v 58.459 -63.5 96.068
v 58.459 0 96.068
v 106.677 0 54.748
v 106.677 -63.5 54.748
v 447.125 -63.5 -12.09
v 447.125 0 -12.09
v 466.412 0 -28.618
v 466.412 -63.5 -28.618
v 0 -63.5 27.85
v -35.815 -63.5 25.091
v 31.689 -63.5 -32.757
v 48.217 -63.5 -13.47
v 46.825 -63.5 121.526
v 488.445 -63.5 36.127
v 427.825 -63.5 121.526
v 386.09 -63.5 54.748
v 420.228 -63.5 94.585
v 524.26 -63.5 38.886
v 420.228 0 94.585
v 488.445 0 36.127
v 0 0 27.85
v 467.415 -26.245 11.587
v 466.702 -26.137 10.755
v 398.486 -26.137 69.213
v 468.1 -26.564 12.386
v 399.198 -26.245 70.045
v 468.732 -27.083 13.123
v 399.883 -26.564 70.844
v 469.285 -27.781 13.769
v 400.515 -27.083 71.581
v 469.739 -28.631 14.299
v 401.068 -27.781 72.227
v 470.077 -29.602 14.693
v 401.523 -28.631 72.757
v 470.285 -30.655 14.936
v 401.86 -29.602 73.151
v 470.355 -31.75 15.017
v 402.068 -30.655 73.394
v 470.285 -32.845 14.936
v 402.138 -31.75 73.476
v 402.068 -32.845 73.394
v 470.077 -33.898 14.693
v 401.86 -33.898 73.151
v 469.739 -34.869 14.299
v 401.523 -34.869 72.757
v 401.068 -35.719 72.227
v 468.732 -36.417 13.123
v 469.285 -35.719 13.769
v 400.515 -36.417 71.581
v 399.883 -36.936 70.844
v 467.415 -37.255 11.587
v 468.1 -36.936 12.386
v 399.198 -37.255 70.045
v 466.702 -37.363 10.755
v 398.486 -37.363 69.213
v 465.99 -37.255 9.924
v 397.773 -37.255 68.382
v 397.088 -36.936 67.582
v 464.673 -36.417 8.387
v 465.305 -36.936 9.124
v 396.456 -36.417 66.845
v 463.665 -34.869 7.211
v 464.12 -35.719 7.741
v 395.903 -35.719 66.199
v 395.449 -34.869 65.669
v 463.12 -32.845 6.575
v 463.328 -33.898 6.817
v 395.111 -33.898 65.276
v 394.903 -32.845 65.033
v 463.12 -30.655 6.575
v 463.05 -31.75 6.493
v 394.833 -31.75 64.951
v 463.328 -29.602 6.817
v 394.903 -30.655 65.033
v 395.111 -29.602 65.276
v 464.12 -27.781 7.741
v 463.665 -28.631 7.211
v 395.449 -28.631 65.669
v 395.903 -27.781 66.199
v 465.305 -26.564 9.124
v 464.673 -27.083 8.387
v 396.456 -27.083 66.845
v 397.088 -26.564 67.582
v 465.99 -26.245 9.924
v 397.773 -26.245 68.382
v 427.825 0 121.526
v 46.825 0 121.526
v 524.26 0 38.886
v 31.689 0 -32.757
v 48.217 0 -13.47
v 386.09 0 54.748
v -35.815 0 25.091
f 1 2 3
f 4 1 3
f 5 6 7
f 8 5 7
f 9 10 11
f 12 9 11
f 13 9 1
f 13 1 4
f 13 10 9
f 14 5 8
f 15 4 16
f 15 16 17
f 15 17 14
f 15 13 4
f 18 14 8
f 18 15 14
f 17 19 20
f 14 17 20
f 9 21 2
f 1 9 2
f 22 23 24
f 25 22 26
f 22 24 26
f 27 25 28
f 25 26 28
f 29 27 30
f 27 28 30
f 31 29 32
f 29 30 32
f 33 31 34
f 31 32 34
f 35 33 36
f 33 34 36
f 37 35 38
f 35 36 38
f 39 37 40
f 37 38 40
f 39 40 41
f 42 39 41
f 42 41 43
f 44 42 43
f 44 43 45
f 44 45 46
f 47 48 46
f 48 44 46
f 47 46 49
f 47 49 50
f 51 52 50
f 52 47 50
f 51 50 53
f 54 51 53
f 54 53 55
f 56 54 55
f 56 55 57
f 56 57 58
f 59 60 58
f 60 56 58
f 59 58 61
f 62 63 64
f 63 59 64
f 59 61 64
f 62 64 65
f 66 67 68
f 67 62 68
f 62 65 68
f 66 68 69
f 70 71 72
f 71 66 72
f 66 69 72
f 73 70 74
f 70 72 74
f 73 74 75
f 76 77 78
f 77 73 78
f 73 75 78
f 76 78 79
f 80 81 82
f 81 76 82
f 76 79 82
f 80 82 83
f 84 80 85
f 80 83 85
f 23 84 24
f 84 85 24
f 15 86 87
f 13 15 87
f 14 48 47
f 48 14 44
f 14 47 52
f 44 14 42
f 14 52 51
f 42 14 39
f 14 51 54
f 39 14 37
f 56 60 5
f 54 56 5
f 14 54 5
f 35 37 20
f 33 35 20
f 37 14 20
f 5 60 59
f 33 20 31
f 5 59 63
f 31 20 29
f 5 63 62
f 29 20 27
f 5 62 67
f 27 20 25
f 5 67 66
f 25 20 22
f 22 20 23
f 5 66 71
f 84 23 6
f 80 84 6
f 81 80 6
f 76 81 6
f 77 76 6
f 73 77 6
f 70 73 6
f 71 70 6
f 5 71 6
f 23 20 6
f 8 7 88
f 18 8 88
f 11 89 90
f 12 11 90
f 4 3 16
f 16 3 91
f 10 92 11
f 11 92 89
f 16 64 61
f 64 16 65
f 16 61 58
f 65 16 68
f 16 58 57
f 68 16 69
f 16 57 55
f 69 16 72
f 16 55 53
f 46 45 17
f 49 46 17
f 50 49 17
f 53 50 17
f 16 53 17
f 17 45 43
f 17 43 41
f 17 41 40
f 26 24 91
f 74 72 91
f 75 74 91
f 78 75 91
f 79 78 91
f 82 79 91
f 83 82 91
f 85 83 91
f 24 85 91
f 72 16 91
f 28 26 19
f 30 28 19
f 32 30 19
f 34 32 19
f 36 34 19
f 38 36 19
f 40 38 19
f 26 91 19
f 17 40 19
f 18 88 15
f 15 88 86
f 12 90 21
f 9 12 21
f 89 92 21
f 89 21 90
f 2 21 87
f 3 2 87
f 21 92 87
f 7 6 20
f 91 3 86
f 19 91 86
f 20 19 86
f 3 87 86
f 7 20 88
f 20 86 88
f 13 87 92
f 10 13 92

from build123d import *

# Parameters (mm, degrees)
F1_DEPTH = 63.5
F2_R     = 5.6131699843
F3_DEPTH = 107.696


# Not quite as in the source:
# - the program builds the solid bodies; features that only make, move or delete a surface that nothing else refers to are left out


with BuildPart() as f1:
    # F0 (on Front) → F1 (new body)
    with BuildSketch(Plane.XZ):
        Polygon((46.8248670694, 121.5258430131), (-35.8149119383, 25.0910623293), (31.6894345404, -32.7567829762), (48.2173903419, -13.4698268394), (0, 27.8500626645), (58.4593796701, 96.0680265203), (106.676770012, 54.7481370164), (386.0897425486, 54.7481370164), (420.2281583997, 94.5852552302), (488.444735815, 36.1270636701), (447.1248463111, -12.0903266718), (466.4118024479, -28.6182824733), (524.2596477533, 38.8860640054), (427.8248670694, 121.5258430131), align=None)
    extrude(amount=F1_DEPTH)

    # F2 (on face) → F3 (join)
    with BuildSketch(Plane(origin=(195.5607291239, 0, -167.5857540484), x_dir=(0, 1, 0), z_dir=(0.7593289818, 0, -0.6507069213))):
        with Locations((-31.75, 311.8531148615)):
            Circle(F2_R)
    extrude(amount=F3_DEPTH)


solid = f1.part
